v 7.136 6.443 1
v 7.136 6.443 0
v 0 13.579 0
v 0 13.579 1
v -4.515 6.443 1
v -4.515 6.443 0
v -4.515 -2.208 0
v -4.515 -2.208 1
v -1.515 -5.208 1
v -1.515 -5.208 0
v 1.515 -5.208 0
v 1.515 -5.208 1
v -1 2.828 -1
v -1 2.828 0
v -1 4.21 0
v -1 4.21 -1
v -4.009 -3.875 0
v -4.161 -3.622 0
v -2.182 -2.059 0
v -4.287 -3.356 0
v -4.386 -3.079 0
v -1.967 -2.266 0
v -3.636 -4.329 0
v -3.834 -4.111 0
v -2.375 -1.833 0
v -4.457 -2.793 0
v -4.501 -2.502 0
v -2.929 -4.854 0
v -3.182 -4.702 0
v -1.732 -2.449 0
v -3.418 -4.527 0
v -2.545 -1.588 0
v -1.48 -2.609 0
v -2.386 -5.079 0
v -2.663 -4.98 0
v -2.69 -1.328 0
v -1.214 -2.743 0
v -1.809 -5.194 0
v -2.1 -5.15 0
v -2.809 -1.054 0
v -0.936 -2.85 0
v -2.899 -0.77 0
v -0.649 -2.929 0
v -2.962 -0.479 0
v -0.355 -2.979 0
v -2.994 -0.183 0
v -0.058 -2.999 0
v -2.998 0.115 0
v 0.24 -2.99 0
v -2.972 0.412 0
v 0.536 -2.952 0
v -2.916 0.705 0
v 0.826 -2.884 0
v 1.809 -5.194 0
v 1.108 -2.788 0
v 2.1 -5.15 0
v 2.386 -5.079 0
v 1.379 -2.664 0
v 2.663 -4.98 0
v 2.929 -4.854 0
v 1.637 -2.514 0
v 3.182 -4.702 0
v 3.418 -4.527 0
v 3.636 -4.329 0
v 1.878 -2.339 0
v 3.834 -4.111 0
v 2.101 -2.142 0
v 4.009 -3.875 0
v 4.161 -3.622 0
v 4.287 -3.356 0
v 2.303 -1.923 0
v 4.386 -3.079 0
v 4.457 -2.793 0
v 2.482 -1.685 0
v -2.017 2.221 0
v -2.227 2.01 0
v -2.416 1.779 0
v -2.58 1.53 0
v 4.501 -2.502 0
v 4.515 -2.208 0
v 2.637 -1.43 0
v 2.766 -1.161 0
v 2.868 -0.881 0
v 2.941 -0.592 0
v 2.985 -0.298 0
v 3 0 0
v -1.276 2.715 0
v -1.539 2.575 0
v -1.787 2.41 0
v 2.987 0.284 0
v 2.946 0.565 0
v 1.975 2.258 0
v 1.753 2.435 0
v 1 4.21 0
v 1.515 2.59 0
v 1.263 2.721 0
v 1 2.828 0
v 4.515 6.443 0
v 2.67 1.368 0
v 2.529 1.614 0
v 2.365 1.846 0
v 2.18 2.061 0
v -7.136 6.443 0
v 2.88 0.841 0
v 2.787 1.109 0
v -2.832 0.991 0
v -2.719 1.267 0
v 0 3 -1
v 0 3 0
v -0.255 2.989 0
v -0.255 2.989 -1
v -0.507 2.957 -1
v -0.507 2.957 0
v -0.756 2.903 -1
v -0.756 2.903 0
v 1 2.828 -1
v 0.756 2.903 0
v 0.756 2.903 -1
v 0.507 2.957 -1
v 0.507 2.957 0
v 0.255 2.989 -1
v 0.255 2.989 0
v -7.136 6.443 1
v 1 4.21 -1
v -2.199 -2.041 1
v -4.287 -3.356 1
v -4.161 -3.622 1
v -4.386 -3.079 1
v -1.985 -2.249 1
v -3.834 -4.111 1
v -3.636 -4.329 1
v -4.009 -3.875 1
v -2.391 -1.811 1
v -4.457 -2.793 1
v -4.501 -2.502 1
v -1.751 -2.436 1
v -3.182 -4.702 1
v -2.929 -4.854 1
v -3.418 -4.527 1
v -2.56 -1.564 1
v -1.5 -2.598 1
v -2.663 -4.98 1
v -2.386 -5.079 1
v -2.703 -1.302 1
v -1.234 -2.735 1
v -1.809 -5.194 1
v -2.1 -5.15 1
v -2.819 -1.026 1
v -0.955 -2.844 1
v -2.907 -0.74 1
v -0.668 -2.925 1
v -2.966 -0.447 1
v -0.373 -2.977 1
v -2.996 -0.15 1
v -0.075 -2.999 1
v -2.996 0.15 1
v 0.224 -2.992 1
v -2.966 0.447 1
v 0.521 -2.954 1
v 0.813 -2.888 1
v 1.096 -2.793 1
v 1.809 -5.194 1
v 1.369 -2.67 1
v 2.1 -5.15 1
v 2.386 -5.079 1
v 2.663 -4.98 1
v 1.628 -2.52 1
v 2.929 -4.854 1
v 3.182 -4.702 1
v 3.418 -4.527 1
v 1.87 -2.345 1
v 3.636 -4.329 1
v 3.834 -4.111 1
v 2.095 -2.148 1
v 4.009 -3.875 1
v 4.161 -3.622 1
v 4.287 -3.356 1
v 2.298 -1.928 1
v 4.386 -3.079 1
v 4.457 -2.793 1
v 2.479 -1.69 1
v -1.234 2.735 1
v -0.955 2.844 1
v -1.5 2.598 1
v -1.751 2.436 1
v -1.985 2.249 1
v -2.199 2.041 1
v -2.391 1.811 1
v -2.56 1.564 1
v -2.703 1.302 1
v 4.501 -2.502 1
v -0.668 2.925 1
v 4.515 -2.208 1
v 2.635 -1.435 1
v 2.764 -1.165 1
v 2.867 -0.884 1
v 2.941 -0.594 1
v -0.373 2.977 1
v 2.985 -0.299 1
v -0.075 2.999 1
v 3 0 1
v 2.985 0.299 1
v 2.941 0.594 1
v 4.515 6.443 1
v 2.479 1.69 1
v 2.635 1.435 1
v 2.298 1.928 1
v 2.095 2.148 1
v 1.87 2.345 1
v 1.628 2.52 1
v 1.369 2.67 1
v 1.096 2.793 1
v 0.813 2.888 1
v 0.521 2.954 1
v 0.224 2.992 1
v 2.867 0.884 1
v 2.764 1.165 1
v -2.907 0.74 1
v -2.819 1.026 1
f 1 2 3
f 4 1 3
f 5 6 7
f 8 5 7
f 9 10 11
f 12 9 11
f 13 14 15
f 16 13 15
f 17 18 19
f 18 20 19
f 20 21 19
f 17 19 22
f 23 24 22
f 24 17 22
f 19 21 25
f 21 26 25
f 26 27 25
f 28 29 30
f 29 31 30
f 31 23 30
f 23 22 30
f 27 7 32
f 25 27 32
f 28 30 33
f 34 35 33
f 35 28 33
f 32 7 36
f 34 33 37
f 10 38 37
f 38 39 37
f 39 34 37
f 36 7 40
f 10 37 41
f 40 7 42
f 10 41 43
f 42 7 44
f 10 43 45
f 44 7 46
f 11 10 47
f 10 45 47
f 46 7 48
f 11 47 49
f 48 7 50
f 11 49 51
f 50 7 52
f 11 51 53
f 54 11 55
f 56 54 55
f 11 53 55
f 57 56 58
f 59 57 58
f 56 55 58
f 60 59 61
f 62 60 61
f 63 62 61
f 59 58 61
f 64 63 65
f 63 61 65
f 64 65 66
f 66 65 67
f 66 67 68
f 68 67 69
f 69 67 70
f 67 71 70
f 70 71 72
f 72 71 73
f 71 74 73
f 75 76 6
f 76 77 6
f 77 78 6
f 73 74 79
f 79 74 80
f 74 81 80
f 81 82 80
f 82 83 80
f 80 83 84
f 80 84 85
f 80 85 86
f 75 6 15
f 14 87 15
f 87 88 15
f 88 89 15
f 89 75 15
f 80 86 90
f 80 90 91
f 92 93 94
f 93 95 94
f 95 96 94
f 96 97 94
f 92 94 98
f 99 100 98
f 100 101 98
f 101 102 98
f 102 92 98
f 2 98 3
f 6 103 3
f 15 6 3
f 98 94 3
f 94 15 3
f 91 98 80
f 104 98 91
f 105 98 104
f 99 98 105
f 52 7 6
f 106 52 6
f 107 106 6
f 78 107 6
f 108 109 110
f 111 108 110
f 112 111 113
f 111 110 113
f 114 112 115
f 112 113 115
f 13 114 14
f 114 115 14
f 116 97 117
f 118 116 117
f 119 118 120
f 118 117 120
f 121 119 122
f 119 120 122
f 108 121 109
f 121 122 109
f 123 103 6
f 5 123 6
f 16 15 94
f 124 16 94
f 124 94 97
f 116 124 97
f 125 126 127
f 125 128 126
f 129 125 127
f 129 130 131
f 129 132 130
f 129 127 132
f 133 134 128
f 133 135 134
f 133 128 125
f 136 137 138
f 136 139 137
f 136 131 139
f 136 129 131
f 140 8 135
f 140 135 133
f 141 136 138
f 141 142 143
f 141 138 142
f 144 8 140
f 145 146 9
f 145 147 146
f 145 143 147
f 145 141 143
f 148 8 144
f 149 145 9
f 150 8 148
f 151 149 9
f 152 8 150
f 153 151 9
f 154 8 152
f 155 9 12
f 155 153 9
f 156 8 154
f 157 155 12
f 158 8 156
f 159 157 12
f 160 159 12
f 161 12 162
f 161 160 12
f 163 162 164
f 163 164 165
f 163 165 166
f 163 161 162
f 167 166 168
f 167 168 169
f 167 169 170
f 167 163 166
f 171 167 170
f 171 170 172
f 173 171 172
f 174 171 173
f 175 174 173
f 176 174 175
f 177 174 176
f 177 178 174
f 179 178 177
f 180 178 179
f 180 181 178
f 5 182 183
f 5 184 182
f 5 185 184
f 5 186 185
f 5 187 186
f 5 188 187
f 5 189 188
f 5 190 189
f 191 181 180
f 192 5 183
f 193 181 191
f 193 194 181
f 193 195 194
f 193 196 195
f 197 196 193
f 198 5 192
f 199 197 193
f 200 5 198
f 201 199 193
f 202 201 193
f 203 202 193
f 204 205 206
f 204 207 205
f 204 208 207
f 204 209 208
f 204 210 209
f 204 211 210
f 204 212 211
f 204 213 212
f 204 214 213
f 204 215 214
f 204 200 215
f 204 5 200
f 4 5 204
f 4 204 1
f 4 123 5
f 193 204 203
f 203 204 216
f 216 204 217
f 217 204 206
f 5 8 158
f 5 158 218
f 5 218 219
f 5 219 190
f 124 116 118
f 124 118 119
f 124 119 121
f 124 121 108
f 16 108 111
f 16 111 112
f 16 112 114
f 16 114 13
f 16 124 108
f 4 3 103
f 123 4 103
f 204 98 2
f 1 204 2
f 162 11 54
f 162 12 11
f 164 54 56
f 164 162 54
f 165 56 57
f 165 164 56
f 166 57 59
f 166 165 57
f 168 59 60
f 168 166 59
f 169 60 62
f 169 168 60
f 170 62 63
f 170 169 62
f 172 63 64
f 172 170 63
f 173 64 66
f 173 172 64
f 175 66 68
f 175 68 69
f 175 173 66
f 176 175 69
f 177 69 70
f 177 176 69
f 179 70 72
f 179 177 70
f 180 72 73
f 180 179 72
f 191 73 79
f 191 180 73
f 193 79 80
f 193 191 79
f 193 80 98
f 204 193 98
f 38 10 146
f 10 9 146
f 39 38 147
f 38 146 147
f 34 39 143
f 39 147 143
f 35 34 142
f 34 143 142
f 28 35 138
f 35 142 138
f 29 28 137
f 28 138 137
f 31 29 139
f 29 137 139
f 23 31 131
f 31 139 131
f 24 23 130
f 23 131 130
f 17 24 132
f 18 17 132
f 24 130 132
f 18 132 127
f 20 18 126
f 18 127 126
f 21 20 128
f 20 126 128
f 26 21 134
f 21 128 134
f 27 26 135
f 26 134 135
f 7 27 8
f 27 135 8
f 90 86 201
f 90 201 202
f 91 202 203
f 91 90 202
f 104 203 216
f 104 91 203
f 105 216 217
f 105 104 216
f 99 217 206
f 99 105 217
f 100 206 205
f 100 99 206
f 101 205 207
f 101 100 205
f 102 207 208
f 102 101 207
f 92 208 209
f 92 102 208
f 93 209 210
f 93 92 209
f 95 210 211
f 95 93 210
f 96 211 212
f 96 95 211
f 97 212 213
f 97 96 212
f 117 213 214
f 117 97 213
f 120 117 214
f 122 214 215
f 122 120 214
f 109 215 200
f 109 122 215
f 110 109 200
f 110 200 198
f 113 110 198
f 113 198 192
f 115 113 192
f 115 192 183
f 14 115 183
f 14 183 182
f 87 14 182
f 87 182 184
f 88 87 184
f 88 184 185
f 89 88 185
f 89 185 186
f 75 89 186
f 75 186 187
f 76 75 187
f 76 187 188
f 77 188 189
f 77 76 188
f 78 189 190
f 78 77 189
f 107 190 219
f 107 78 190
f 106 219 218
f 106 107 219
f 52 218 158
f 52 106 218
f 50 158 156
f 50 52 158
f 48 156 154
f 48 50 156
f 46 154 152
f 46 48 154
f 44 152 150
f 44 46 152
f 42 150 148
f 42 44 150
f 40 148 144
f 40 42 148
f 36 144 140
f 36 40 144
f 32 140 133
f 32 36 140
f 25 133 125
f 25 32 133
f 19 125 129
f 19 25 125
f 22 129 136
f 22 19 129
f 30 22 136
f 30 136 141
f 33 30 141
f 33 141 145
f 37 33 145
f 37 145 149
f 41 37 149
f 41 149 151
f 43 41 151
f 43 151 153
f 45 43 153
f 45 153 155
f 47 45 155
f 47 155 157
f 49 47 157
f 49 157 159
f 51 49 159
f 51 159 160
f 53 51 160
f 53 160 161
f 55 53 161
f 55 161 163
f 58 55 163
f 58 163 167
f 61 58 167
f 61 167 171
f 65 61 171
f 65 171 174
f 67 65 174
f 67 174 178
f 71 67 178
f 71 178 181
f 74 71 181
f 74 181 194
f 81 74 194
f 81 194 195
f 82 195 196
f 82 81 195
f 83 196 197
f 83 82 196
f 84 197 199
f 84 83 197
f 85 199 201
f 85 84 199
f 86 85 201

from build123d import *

# Parameters (mm, degrees)
SKETCH1_R           = 3
BOSS_EXTRUDE1_DEPTH = 1
FILLET1_R           = 3
BOSS_EXTRUDE2_DEPTH = 1


with BuildPart() as part:
    # Sketch1 → Boss-Extrude1 (new body)
    with BuildSketch(Plane.XY):
        Polygon((-4.515055907, -5.207968635), (4.515055907, -5.207968635), (4.515055907, 6.442798737), (7.135711465, 6.442798737), (0, 13.578510202), (-7.135711465, 6.442798737), (-4.515055907, 6.442798737), align=None)
        Circle(SKETCH1_R, mode=Mode.SUBTRACT)
    extrude(amount=BOSS_EXTRUDE1_DEPTH)

    # Fillet1
    fillet1_edges = [part.edges().sort_by_distance(p)[0] for p in [
        (4.515055907, -5.207968635, 0.5),
        (-4.515055907, -5.207968635, 0.5),
    ]]
    fillet(fillet1_edges, radius=FILLET1_R)

    # Sketch2 → Boss-Extrude2 (add)
    with BuildSketch(Plane(origin=(0, 0, 0), x_dir=(-1, 0, 0), z_dir=(0, 0, -1))):
        with BuildLine():
            ThreePointArc((0, 3), (0.507305936, 2.956795679), (1, 2.828427125))
            Line((1, 2.828427125), (1, 4.210117693))
            Line((1, 4.210117693), (0, 4.210117693))
            Line((0, 4.210117693), (0, 3))
        make_face()
        with BuildLine():
            ThreePointArc((-1, 2.828427125), (-0.507305936, 2.956795679), (0, 3))
            Line((0, 3), (0, 4.210117693))
            Line((0, 4.210117693), (-1, 4.210117693))
            Line((-1, 4.210117693), (-1, 2.828427125))
        make_face()
    extrude(amount=BOSS_EXTRUDE2_DEPTH)


solid = part.part
